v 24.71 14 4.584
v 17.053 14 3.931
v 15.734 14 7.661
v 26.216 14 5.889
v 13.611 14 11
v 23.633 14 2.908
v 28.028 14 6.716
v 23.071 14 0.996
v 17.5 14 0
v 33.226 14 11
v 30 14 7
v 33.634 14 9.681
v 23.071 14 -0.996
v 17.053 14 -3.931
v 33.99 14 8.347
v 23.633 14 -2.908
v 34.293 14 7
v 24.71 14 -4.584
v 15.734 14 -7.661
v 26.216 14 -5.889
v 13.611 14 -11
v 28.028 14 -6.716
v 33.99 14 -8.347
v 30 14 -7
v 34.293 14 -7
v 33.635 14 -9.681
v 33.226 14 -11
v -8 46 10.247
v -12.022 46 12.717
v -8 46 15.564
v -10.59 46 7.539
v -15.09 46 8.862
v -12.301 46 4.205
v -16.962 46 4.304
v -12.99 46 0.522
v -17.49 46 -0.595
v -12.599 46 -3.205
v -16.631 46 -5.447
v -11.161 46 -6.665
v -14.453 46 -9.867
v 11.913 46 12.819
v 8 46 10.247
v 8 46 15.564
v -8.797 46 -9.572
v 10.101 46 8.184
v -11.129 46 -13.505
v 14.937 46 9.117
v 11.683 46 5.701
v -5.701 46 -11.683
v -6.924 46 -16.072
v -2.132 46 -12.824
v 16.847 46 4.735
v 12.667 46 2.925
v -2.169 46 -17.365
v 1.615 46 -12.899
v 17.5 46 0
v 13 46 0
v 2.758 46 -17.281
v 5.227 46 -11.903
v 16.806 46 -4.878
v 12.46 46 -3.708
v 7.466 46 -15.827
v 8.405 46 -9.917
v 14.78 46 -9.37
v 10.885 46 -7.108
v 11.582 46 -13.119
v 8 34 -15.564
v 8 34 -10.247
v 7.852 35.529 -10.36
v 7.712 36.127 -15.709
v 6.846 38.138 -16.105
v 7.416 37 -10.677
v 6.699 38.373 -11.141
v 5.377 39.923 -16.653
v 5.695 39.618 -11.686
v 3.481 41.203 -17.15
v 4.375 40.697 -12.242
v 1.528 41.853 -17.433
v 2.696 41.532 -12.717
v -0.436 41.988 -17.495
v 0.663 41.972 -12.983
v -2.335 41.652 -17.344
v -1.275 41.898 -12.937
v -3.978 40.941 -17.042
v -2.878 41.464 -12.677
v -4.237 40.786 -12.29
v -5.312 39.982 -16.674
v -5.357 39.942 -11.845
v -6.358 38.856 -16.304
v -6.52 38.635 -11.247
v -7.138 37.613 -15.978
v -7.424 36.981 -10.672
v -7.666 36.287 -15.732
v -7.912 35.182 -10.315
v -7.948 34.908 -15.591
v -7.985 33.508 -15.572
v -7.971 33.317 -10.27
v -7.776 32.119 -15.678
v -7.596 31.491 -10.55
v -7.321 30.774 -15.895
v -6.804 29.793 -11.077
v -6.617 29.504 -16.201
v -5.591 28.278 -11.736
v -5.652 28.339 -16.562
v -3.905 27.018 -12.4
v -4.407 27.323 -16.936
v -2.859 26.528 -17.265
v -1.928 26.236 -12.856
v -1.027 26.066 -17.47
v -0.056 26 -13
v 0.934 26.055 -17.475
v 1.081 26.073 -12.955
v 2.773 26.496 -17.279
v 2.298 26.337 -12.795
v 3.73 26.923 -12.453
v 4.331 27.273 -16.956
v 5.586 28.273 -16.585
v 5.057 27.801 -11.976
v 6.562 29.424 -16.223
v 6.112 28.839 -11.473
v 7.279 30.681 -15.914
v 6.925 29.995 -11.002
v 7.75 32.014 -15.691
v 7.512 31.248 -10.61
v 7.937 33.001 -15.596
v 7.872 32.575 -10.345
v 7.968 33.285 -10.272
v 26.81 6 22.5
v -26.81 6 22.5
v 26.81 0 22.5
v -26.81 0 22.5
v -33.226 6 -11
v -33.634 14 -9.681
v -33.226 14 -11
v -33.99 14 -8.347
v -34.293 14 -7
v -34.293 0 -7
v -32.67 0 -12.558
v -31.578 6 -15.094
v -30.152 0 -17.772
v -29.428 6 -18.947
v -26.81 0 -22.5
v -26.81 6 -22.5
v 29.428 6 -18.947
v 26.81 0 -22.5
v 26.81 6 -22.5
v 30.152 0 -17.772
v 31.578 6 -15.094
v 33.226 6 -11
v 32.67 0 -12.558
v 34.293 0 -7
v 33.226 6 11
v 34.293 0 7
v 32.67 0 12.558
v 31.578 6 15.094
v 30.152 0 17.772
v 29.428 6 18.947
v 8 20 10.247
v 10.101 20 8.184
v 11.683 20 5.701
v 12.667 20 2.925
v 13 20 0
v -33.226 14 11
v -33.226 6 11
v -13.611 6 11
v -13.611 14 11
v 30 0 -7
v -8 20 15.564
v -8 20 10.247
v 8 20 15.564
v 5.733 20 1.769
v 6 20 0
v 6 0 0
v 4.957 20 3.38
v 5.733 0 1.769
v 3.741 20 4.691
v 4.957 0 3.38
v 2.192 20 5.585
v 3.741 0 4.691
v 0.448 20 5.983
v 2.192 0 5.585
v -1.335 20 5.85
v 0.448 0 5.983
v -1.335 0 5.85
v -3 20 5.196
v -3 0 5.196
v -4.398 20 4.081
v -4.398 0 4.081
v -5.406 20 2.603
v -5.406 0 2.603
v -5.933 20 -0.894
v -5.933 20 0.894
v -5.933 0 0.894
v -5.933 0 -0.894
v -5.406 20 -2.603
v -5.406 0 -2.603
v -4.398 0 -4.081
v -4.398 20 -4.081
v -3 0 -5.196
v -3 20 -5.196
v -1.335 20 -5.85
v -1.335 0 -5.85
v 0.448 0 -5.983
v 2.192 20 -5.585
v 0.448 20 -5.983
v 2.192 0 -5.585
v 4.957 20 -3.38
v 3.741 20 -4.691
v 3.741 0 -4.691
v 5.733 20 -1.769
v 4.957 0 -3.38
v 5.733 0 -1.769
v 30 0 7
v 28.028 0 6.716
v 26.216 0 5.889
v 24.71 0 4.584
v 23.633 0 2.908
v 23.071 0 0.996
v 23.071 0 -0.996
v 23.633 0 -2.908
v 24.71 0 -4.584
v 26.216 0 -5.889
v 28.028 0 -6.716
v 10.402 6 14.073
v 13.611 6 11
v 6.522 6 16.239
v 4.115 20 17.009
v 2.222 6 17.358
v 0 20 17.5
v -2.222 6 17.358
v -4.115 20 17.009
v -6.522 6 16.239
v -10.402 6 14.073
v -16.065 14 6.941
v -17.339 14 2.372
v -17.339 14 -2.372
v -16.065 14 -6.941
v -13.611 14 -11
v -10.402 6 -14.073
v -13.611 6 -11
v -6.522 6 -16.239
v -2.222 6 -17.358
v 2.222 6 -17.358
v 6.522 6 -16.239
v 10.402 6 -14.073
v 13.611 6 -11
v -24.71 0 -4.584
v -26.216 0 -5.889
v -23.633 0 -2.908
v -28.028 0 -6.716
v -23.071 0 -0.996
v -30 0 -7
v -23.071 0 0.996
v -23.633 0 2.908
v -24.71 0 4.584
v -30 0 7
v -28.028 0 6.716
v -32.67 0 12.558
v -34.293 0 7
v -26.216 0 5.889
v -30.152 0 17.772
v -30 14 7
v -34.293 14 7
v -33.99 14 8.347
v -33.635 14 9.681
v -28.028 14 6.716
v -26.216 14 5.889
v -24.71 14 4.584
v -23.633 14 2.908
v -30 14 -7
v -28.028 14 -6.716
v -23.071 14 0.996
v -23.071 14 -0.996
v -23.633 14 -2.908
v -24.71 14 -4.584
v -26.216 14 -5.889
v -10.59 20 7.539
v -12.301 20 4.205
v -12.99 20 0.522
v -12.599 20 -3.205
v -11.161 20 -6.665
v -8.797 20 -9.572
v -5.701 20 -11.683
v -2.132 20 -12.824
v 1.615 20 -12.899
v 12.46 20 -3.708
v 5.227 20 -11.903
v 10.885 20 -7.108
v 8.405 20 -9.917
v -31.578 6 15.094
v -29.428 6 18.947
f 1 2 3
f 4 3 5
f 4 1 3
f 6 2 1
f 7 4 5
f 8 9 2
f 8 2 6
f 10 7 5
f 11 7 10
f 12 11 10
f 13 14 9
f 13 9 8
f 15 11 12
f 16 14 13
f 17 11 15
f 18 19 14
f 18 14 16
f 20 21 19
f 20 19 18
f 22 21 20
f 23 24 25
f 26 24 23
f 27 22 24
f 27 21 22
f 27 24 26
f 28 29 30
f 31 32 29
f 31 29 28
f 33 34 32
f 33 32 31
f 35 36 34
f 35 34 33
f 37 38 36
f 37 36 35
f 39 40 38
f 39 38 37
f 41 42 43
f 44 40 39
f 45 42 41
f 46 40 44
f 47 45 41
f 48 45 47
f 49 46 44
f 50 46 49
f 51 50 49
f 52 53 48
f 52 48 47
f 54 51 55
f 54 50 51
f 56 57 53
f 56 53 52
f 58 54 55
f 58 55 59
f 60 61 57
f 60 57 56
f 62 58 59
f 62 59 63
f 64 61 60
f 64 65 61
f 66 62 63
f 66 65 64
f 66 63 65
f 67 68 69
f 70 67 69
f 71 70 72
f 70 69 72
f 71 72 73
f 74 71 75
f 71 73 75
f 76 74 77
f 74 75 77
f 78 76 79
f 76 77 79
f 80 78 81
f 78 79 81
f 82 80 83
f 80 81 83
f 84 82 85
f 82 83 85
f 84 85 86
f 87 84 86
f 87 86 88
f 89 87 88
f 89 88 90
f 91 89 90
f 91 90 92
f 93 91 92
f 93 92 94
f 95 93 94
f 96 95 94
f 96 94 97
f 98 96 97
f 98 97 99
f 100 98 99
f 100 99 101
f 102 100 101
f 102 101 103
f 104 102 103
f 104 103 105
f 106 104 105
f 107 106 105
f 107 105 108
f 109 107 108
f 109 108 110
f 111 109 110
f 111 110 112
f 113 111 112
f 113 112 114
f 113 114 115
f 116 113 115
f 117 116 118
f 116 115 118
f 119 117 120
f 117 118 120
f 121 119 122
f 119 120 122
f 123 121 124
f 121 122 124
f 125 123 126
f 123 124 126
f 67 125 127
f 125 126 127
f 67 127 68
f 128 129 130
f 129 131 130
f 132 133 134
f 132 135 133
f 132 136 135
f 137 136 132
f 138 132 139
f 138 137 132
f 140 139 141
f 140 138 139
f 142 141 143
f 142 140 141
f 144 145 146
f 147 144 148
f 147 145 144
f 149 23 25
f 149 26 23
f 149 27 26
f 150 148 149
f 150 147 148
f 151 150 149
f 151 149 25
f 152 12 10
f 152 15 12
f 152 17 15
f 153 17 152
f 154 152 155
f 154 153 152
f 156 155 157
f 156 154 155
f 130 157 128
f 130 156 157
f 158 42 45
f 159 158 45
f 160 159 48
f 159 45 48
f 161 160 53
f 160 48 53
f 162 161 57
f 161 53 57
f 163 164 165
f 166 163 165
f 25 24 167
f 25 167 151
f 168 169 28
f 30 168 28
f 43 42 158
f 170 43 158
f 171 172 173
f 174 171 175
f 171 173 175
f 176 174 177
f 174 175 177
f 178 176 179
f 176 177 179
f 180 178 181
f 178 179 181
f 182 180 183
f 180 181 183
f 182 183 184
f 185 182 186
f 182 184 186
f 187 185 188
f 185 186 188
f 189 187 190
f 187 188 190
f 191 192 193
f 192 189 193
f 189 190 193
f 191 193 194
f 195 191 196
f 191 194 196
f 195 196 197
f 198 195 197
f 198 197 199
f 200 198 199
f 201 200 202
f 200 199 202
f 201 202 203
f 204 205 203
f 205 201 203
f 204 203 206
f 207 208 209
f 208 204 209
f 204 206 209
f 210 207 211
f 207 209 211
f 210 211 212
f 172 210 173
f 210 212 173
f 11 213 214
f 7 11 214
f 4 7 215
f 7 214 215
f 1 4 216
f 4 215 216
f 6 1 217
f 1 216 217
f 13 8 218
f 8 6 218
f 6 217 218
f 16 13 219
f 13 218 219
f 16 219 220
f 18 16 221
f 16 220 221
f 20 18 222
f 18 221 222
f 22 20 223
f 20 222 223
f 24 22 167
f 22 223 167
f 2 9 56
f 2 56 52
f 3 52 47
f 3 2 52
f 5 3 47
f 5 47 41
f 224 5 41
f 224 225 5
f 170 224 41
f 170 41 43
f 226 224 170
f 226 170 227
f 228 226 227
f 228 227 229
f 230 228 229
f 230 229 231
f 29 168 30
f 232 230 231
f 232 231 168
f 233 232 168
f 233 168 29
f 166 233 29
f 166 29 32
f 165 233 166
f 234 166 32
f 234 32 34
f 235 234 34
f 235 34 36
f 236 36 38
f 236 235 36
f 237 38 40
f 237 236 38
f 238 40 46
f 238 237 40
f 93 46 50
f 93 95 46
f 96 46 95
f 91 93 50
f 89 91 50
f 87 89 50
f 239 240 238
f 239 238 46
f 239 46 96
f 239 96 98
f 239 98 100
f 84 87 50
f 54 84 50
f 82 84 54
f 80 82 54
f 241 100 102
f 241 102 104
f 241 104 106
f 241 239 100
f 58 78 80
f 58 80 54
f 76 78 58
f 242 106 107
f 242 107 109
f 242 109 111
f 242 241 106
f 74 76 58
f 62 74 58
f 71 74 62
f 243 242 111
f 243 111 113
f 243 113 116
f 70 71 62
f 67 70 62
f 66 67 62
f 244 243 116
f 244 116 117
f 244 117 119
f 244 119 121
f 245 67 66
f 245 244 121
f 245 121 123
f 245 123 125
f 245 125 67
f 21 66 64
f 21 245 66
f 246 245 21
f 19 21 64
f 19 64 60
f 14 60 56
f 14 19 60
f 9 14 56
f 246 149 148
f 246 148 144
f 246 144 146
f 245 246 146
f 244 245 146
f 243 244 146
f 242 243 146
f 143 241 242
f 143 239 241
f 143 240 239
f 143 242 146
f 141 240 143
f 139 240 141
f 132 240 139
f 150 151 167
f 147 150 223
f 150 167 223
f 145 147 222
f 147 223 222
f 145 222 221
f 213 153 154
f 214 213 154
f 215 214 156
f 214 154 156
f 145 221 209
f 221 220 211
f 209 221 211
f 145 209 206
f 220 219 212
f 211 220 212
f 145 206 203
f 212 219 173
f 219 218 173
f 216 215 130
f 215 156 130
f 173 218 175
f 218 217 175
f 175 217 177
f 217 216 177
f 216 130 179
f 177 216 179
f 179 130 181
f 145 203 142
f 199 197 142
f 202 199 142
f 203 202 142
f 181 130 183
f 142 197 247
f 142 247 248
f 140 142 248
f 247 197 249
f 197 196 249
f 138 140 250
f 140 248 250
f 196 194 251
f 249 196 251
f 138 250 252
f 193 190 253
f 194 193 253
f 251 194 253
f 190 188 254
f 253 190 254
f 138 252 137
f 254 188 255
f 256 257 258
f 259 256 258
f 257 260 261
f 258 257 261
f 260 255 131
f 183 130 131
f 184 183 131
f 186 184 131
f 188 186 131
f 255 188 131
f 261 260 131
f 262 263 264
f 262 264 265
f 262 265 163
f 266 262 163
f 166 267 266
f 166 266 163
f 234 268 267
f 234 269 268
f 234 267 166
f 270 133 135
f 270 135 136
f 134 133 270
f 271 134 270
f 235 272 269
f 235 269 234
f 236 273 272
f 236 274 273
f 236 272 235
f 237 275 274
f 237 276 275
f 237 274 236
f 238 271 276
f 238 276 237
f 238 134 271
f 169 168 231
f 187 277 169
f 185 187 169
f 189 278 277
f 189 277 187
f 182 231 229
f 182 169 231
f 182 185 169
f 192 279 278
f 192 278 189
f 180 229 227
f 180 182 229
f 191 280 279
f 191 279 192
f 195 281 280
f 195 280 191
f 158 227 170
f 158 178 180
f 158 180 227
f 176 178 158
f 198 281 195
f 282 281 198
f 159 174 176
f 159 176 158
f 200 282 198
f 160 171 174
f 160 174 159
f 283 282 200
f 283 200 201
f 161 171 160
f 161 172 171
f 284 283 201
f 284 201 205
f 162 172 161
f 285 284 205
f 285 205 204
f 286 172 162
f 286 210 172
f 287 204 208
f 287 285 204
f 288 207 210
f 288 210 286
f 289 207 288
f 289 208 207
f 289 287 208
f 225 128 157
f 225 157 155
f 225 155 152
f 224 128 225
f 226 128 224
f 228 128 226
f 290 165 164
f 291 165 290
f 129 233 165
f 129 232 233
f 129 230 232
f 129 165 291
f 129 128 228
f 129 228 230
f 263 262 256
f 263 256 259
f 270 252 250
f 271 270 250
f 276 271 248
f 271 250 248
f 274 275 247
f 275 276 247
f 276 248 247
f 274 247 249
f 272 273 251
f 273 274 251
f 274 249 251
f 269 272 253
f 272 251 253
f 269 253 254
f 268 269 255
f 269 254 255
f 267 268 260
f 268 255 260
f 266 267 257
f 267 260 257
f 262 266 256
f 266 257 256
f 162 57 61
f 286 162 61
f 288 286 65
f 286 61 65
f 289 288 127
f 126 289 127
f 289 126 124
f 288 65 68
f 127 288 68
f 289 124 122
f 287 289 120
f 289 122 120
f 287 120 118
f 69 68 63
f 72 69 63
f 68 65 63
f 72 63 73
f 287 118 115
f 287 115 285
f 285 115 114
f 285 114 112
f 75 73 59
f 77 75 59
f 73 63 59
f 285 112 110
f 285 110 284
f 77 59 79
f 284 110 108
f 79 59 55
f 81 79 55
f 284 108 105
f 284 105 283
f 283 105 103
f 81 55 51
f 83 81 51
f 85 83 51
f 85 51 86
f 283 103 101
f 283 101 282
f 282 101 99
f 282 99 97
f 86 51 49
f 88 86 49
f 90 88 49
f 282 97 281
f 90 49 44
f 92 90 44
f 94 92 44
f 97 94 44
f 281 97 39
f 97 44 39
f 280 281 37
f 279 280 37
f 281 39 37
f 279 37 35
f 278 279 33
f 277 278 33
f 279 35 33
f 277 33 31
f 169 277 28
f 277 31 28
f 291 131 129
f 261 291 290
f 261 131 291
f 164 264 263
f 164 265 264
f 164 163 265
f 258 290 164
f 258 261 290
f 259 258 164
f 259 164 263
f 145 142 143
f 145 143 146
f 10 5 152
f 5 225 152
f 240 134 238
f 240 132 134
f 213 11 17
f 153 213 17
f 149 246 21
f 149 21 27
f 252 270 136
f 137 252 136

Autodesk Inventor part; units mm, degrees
ref_plane "YZ Plane" through (0, 0, 0) normal (1, 0, 0) x (0, 1, 0)
ref_plane "XZ Plane" through (0, 0, 0) normal (0, 1, 0) x (-1, 0, 0)
ref_plane "XY Plane" through (0, 0, 0) normal (0, 0, 1) x (1, 0, 0)
sketch "草图1" plane through (0, 0, 0) normal (0, 1, 0) x (-1, 0, 0)
  line L0 (55.7629, 0) -> (-64.7988, 0)
  line L1 (26.8095, -22.5) -> (-26.8095, -22.5)
  line L2 (26.8095, 22.5) -> (-29.1705, 22.5)
  line L3 (0, -45.1984) -> (0, 63.6584)
  arc A0 (30, 7) -> (30, -7) centre (30, 0) ccw
  arc A1 (-30, -7) -> (-30, 7) centre (-30, 0) ccw
  line L4 (30, -7) -> (34.2929, -7)
  line L5 (30, 7) -> (34.2929, 7)
  line L6 (-30, -7) -> (-34.2929, -7)
  line L7 (-30, 7) -> (-34.2929, 7)
  arc A2 (26.8095, -22.5) -> (34.2929, -7) centre (0, 0) ccw
  arc A3 (34.2929, 7) -> (26.8095, 22.5) centre (0, 0) ccw
  arc A4 (-26.8095, 22.5) -> (-34.2929, 7) centre (0, 0) ccw
  arc A5 (-34.2929, -7) -> (-26.8095, -22.5) centre (0, 0) ccw
  dimension "d1" = 45
  dimension "d2" = 14
  dimension "d3" = 60
extrude "拉伸1" add sketch "草图1" along normal blind 6
sketch "草图2" plane through (0, 6, 0) normal (0, 1, 0) x (1, 0, 0)
  arc A0 (34.2929, 7) -> (26.8095, 22.5) centre (0, 0) ccw projected
  circle A1 centre (0, 0) radius 17.5
  dimension "d6" = 35
extrude "拉伸2" add sketch "草图2" along normal blind 40
sketch "草图3" plane through (0, 0, 0) normal (0, -1, 0) x (1, 0, 0)
  arc A0 (-34.2929, -7) -> (-26.8095, -22.5) centre (0, 0) ccw projected
  circle A1 centre (0, 0) radius 6
  dimension "d9" = 12
extrude "拉伸3" cut sketch "草图3" against normal blind 60
sketch "草图4" plane through (0, 6, 0) normal (0, 1, 0) x (1, 0, 0)
  circle A0 centre (0, 0) radius 17.5 projected
  arc A1 (-26.8095, 22.5) -> (-34.2929, 7) centre (0, 0) ccw projected
  line L0 (-34.2929, 7) -> (-30, 7) projected
  arc A2 (-30, -7) -> (-30, 7) centre (-30, 0) ccw projected
  line L1 (-30, -7) -> (-34.2929, -7) projected
  arc A3 (-34.2929, -7) -> (-26.8095, -22.5) centre (0, 0) ccw projected
  arc A4 (26.8095, -22.5) -> (34.2929, -7) centre (0, 0) ccw projected
  line L2 (34.2929, -7) -> (30, -7) projected
  arc A5 (30, 7) -> (30, -7) centre (30, 0) ccw projected
  line L3 (30, 7) -> (34.2929, 7) projected
  arc A6 (34.2929, 7) -> (26.8095, 22.5) centre (0, 0) ccw projected
  line L4 (-33.2265, 11) -> (-13.6107, 11)
  line L5 (13.6107, 11) -> (33.2265, 11)
  line L6 (-33.2265, -11) -> (-13.6107, -11)
  line L7 (13.6107, -11) -> (33.2265, -11)
  line L8 (-37.479, 0) -> (55.827, 0)
  line L9 (0, 23.5503) -> (0, -22.0958)
  dimension "d12" = 22
extrude "拉伸4" add sketch "草图4" along normal blind 8 contours L8 A5 L2 A4 L7 A0 | A0 L5 A6 L3 A5 L8 | L8 A2 L0 A1 L4 A0 | A0 L6 A3 L1 A2 L8
sketch "草图5" plane through (0, 46, 0) normal (0, 1, 0) x (1, 0, 0)
  circle A0 centre (0, 0) radius 6 projected
  circle A1 centre (0, 0) radius 17.5 projected
  circle A2 centre (0, 0) radius 13
  dimension "d15" = 26
extrude "拉伸5" cut sketch "草图5" against normal blind 26 contours A2
sketch "草图6" plane through (0, 0, 0) normal (0, 0, 1) x (1, 0, 0)
  point P0 (0, 0)
sketch "草图7" plane through (0, 0, 0) normal (0, 0, 1) x (1, 0, 0)
  line L0 (0, 0) -> (0, 58.8844)
  line L1 (-23, 14) -> (-17.5, 14) projected
  line L2 (-17.5, 14) -> (-17.5, 46) projected
  line L3 (-17.5, 46) -> (-13, 46) projected
  line L4 (-13, 46) -> (-13, 20) projected
  line L5 (-13, 20) -> (-6, 20) projected
  line L6 (-6, 20) -> (-6, 0) projected
  line L7 (-6, 0) -> (-23, 0) projected
  line L8 (-23, 0) -> (-23, 14) projected
  line L9 (17.5, 14) -> (23, 14) projected
  line L10 (23, 14) -> (23, 0) projected
  line L11 (23, 0) -> (6, 0) projected
  line L12 (6, 0) -> (6, 20) projected
  line L13 (6, 20) -> (13, 20) projected
  line L14 (13, 20) -> (13, 46) projected
  line L15 (13, 46) -> (17.5, 46) projected
  line L16 (17.5, 46) -> (17.5, 14) projected
  circle A0 centre (0, 34) radius 8
  line L17 (-13, 46) -> (13, 46) projected
  dimension "d18" = 16
  dimension "d19" = 12
extrude "拉伸6" cut sketch "草图7" against normal blind 26 contours A0 L0 | L0 A0
sketch "草图8" plane through (0, 0, 0) normal (0, 0, 1) x (1, 0, 0)
  line L0 (-23, 14) -> (-17.5, 14) projected
  line L1 (-17.5, 14) -> (-17.5, 46) projected
  line L2 (-17.5, 46) -> (-13, 46) projected
  line L3 (-13, 46) -> (-13, 20) projected
  line L4 (-13, 20) -> (-6, 20) projected
  line L5 (-6, 20) -> (-6, 0) projected
  line L6 (-6, 0) -> (-23, 0) projected
  line L7 (-23, 0) -> (-23, 14) projected
  line L8 (17.5, 14) -> (23, 14) projected
  line L9 (23, 14) -> (23, 0) projected
  line L10 (23, 0) -> (6, 0) projected
  line L11 (6, 0) -> (6, 20) projected
  line L12 (6, 20) -> (13, 20) projected
  line L13 (13, 20) -> (13, 46) projected
  line L14 (13, 46) -> (17.5, 46) projected
  line L15 (17.5, 46) -> (17.5, 14) projected
  line L16 (-23, 14) -> (-17.5, 14) projected
  line L17 (-17.5, 14) -> (-17.5, 46) projected
  line L18 (-17.5, 46) -> (-13, 46) projected
  line L19 (-13, 46) -> (-13, 20) projected
  line L20 (-13, 20) -> (-6, 20) projected
  line L21 (-6, 20) -> (-6, 0) projected
  line L22 (-6, 0) -> (-23, 0) projected
  line L23 (-23, 0) -> (-23, 14) projected
  line L24 (17.5, 14) -> (23, 14) projected
  line L25 (23, 14) -> (23, 0) projected
  line L26 (23, 0) -> (6, 0) projected
  line L27 (6, 0) -> (6, 20) projected
  line L28 (6, 20) -> (13, 20) projected
  line L29 (13, 20) -> (13, 46) projected
  line L30 (13, 46) -> (17.5, 46) projected
  line L31 (17.5, 46) -> (17.5, 14) projected
  line L32 (-23, 14) -> (-17.5, 14) projected
  line L33 (-17.5, 14) -> (-17.5, 46) projected
  line L34 (-17.5, 46) -> (-13, 46) projected
  line L35 (-13, 46) -> (-13, 20) projected
  line L36 (-13, 20) -> (-6, 20) projected
  line L37 (-6, 20) -> (-6, 0) projected
  line L38 (-6, 0) -> (-23, 0) projected
  line L39 (-23, 0) -> (-23, 14) projected
  line L40 (17.5, 14) -> (23, 14) projected
  line L41 (23, 14) -> (23, 0) projected
  line L42 (23, 0) -> (6, 0) projected
  line L43 (6, 0) -> (6, 20) projected
  line L44 (6, 20) -> (13, 20) projected
  line L45 (13, 20) -> (13, 46) projected
  line L46 (13, 46) -> (17.5, 46) projected
  line L47 (17.5, 46) -> (17.5, 14) projected
  line L48 (0, 49.6225) -> (0, -12.8831)
  line L49 (-8, 46) -> (8, 46)
  line L50 (8, 46) -> (8, 20)
  line L51 (8, 20) -> (-8, 20)
  line L52 (-8, 20) -> (-8, 46)
  point P0 (0, 0)
  dimension "d22" = 16
  dimension "d23" = 26
extrude "拉伸7" cut sketch "草图8" along normal blind 26 contours L4 L52 L49 L48 L51 | L48 L49 L50 L12 L51
